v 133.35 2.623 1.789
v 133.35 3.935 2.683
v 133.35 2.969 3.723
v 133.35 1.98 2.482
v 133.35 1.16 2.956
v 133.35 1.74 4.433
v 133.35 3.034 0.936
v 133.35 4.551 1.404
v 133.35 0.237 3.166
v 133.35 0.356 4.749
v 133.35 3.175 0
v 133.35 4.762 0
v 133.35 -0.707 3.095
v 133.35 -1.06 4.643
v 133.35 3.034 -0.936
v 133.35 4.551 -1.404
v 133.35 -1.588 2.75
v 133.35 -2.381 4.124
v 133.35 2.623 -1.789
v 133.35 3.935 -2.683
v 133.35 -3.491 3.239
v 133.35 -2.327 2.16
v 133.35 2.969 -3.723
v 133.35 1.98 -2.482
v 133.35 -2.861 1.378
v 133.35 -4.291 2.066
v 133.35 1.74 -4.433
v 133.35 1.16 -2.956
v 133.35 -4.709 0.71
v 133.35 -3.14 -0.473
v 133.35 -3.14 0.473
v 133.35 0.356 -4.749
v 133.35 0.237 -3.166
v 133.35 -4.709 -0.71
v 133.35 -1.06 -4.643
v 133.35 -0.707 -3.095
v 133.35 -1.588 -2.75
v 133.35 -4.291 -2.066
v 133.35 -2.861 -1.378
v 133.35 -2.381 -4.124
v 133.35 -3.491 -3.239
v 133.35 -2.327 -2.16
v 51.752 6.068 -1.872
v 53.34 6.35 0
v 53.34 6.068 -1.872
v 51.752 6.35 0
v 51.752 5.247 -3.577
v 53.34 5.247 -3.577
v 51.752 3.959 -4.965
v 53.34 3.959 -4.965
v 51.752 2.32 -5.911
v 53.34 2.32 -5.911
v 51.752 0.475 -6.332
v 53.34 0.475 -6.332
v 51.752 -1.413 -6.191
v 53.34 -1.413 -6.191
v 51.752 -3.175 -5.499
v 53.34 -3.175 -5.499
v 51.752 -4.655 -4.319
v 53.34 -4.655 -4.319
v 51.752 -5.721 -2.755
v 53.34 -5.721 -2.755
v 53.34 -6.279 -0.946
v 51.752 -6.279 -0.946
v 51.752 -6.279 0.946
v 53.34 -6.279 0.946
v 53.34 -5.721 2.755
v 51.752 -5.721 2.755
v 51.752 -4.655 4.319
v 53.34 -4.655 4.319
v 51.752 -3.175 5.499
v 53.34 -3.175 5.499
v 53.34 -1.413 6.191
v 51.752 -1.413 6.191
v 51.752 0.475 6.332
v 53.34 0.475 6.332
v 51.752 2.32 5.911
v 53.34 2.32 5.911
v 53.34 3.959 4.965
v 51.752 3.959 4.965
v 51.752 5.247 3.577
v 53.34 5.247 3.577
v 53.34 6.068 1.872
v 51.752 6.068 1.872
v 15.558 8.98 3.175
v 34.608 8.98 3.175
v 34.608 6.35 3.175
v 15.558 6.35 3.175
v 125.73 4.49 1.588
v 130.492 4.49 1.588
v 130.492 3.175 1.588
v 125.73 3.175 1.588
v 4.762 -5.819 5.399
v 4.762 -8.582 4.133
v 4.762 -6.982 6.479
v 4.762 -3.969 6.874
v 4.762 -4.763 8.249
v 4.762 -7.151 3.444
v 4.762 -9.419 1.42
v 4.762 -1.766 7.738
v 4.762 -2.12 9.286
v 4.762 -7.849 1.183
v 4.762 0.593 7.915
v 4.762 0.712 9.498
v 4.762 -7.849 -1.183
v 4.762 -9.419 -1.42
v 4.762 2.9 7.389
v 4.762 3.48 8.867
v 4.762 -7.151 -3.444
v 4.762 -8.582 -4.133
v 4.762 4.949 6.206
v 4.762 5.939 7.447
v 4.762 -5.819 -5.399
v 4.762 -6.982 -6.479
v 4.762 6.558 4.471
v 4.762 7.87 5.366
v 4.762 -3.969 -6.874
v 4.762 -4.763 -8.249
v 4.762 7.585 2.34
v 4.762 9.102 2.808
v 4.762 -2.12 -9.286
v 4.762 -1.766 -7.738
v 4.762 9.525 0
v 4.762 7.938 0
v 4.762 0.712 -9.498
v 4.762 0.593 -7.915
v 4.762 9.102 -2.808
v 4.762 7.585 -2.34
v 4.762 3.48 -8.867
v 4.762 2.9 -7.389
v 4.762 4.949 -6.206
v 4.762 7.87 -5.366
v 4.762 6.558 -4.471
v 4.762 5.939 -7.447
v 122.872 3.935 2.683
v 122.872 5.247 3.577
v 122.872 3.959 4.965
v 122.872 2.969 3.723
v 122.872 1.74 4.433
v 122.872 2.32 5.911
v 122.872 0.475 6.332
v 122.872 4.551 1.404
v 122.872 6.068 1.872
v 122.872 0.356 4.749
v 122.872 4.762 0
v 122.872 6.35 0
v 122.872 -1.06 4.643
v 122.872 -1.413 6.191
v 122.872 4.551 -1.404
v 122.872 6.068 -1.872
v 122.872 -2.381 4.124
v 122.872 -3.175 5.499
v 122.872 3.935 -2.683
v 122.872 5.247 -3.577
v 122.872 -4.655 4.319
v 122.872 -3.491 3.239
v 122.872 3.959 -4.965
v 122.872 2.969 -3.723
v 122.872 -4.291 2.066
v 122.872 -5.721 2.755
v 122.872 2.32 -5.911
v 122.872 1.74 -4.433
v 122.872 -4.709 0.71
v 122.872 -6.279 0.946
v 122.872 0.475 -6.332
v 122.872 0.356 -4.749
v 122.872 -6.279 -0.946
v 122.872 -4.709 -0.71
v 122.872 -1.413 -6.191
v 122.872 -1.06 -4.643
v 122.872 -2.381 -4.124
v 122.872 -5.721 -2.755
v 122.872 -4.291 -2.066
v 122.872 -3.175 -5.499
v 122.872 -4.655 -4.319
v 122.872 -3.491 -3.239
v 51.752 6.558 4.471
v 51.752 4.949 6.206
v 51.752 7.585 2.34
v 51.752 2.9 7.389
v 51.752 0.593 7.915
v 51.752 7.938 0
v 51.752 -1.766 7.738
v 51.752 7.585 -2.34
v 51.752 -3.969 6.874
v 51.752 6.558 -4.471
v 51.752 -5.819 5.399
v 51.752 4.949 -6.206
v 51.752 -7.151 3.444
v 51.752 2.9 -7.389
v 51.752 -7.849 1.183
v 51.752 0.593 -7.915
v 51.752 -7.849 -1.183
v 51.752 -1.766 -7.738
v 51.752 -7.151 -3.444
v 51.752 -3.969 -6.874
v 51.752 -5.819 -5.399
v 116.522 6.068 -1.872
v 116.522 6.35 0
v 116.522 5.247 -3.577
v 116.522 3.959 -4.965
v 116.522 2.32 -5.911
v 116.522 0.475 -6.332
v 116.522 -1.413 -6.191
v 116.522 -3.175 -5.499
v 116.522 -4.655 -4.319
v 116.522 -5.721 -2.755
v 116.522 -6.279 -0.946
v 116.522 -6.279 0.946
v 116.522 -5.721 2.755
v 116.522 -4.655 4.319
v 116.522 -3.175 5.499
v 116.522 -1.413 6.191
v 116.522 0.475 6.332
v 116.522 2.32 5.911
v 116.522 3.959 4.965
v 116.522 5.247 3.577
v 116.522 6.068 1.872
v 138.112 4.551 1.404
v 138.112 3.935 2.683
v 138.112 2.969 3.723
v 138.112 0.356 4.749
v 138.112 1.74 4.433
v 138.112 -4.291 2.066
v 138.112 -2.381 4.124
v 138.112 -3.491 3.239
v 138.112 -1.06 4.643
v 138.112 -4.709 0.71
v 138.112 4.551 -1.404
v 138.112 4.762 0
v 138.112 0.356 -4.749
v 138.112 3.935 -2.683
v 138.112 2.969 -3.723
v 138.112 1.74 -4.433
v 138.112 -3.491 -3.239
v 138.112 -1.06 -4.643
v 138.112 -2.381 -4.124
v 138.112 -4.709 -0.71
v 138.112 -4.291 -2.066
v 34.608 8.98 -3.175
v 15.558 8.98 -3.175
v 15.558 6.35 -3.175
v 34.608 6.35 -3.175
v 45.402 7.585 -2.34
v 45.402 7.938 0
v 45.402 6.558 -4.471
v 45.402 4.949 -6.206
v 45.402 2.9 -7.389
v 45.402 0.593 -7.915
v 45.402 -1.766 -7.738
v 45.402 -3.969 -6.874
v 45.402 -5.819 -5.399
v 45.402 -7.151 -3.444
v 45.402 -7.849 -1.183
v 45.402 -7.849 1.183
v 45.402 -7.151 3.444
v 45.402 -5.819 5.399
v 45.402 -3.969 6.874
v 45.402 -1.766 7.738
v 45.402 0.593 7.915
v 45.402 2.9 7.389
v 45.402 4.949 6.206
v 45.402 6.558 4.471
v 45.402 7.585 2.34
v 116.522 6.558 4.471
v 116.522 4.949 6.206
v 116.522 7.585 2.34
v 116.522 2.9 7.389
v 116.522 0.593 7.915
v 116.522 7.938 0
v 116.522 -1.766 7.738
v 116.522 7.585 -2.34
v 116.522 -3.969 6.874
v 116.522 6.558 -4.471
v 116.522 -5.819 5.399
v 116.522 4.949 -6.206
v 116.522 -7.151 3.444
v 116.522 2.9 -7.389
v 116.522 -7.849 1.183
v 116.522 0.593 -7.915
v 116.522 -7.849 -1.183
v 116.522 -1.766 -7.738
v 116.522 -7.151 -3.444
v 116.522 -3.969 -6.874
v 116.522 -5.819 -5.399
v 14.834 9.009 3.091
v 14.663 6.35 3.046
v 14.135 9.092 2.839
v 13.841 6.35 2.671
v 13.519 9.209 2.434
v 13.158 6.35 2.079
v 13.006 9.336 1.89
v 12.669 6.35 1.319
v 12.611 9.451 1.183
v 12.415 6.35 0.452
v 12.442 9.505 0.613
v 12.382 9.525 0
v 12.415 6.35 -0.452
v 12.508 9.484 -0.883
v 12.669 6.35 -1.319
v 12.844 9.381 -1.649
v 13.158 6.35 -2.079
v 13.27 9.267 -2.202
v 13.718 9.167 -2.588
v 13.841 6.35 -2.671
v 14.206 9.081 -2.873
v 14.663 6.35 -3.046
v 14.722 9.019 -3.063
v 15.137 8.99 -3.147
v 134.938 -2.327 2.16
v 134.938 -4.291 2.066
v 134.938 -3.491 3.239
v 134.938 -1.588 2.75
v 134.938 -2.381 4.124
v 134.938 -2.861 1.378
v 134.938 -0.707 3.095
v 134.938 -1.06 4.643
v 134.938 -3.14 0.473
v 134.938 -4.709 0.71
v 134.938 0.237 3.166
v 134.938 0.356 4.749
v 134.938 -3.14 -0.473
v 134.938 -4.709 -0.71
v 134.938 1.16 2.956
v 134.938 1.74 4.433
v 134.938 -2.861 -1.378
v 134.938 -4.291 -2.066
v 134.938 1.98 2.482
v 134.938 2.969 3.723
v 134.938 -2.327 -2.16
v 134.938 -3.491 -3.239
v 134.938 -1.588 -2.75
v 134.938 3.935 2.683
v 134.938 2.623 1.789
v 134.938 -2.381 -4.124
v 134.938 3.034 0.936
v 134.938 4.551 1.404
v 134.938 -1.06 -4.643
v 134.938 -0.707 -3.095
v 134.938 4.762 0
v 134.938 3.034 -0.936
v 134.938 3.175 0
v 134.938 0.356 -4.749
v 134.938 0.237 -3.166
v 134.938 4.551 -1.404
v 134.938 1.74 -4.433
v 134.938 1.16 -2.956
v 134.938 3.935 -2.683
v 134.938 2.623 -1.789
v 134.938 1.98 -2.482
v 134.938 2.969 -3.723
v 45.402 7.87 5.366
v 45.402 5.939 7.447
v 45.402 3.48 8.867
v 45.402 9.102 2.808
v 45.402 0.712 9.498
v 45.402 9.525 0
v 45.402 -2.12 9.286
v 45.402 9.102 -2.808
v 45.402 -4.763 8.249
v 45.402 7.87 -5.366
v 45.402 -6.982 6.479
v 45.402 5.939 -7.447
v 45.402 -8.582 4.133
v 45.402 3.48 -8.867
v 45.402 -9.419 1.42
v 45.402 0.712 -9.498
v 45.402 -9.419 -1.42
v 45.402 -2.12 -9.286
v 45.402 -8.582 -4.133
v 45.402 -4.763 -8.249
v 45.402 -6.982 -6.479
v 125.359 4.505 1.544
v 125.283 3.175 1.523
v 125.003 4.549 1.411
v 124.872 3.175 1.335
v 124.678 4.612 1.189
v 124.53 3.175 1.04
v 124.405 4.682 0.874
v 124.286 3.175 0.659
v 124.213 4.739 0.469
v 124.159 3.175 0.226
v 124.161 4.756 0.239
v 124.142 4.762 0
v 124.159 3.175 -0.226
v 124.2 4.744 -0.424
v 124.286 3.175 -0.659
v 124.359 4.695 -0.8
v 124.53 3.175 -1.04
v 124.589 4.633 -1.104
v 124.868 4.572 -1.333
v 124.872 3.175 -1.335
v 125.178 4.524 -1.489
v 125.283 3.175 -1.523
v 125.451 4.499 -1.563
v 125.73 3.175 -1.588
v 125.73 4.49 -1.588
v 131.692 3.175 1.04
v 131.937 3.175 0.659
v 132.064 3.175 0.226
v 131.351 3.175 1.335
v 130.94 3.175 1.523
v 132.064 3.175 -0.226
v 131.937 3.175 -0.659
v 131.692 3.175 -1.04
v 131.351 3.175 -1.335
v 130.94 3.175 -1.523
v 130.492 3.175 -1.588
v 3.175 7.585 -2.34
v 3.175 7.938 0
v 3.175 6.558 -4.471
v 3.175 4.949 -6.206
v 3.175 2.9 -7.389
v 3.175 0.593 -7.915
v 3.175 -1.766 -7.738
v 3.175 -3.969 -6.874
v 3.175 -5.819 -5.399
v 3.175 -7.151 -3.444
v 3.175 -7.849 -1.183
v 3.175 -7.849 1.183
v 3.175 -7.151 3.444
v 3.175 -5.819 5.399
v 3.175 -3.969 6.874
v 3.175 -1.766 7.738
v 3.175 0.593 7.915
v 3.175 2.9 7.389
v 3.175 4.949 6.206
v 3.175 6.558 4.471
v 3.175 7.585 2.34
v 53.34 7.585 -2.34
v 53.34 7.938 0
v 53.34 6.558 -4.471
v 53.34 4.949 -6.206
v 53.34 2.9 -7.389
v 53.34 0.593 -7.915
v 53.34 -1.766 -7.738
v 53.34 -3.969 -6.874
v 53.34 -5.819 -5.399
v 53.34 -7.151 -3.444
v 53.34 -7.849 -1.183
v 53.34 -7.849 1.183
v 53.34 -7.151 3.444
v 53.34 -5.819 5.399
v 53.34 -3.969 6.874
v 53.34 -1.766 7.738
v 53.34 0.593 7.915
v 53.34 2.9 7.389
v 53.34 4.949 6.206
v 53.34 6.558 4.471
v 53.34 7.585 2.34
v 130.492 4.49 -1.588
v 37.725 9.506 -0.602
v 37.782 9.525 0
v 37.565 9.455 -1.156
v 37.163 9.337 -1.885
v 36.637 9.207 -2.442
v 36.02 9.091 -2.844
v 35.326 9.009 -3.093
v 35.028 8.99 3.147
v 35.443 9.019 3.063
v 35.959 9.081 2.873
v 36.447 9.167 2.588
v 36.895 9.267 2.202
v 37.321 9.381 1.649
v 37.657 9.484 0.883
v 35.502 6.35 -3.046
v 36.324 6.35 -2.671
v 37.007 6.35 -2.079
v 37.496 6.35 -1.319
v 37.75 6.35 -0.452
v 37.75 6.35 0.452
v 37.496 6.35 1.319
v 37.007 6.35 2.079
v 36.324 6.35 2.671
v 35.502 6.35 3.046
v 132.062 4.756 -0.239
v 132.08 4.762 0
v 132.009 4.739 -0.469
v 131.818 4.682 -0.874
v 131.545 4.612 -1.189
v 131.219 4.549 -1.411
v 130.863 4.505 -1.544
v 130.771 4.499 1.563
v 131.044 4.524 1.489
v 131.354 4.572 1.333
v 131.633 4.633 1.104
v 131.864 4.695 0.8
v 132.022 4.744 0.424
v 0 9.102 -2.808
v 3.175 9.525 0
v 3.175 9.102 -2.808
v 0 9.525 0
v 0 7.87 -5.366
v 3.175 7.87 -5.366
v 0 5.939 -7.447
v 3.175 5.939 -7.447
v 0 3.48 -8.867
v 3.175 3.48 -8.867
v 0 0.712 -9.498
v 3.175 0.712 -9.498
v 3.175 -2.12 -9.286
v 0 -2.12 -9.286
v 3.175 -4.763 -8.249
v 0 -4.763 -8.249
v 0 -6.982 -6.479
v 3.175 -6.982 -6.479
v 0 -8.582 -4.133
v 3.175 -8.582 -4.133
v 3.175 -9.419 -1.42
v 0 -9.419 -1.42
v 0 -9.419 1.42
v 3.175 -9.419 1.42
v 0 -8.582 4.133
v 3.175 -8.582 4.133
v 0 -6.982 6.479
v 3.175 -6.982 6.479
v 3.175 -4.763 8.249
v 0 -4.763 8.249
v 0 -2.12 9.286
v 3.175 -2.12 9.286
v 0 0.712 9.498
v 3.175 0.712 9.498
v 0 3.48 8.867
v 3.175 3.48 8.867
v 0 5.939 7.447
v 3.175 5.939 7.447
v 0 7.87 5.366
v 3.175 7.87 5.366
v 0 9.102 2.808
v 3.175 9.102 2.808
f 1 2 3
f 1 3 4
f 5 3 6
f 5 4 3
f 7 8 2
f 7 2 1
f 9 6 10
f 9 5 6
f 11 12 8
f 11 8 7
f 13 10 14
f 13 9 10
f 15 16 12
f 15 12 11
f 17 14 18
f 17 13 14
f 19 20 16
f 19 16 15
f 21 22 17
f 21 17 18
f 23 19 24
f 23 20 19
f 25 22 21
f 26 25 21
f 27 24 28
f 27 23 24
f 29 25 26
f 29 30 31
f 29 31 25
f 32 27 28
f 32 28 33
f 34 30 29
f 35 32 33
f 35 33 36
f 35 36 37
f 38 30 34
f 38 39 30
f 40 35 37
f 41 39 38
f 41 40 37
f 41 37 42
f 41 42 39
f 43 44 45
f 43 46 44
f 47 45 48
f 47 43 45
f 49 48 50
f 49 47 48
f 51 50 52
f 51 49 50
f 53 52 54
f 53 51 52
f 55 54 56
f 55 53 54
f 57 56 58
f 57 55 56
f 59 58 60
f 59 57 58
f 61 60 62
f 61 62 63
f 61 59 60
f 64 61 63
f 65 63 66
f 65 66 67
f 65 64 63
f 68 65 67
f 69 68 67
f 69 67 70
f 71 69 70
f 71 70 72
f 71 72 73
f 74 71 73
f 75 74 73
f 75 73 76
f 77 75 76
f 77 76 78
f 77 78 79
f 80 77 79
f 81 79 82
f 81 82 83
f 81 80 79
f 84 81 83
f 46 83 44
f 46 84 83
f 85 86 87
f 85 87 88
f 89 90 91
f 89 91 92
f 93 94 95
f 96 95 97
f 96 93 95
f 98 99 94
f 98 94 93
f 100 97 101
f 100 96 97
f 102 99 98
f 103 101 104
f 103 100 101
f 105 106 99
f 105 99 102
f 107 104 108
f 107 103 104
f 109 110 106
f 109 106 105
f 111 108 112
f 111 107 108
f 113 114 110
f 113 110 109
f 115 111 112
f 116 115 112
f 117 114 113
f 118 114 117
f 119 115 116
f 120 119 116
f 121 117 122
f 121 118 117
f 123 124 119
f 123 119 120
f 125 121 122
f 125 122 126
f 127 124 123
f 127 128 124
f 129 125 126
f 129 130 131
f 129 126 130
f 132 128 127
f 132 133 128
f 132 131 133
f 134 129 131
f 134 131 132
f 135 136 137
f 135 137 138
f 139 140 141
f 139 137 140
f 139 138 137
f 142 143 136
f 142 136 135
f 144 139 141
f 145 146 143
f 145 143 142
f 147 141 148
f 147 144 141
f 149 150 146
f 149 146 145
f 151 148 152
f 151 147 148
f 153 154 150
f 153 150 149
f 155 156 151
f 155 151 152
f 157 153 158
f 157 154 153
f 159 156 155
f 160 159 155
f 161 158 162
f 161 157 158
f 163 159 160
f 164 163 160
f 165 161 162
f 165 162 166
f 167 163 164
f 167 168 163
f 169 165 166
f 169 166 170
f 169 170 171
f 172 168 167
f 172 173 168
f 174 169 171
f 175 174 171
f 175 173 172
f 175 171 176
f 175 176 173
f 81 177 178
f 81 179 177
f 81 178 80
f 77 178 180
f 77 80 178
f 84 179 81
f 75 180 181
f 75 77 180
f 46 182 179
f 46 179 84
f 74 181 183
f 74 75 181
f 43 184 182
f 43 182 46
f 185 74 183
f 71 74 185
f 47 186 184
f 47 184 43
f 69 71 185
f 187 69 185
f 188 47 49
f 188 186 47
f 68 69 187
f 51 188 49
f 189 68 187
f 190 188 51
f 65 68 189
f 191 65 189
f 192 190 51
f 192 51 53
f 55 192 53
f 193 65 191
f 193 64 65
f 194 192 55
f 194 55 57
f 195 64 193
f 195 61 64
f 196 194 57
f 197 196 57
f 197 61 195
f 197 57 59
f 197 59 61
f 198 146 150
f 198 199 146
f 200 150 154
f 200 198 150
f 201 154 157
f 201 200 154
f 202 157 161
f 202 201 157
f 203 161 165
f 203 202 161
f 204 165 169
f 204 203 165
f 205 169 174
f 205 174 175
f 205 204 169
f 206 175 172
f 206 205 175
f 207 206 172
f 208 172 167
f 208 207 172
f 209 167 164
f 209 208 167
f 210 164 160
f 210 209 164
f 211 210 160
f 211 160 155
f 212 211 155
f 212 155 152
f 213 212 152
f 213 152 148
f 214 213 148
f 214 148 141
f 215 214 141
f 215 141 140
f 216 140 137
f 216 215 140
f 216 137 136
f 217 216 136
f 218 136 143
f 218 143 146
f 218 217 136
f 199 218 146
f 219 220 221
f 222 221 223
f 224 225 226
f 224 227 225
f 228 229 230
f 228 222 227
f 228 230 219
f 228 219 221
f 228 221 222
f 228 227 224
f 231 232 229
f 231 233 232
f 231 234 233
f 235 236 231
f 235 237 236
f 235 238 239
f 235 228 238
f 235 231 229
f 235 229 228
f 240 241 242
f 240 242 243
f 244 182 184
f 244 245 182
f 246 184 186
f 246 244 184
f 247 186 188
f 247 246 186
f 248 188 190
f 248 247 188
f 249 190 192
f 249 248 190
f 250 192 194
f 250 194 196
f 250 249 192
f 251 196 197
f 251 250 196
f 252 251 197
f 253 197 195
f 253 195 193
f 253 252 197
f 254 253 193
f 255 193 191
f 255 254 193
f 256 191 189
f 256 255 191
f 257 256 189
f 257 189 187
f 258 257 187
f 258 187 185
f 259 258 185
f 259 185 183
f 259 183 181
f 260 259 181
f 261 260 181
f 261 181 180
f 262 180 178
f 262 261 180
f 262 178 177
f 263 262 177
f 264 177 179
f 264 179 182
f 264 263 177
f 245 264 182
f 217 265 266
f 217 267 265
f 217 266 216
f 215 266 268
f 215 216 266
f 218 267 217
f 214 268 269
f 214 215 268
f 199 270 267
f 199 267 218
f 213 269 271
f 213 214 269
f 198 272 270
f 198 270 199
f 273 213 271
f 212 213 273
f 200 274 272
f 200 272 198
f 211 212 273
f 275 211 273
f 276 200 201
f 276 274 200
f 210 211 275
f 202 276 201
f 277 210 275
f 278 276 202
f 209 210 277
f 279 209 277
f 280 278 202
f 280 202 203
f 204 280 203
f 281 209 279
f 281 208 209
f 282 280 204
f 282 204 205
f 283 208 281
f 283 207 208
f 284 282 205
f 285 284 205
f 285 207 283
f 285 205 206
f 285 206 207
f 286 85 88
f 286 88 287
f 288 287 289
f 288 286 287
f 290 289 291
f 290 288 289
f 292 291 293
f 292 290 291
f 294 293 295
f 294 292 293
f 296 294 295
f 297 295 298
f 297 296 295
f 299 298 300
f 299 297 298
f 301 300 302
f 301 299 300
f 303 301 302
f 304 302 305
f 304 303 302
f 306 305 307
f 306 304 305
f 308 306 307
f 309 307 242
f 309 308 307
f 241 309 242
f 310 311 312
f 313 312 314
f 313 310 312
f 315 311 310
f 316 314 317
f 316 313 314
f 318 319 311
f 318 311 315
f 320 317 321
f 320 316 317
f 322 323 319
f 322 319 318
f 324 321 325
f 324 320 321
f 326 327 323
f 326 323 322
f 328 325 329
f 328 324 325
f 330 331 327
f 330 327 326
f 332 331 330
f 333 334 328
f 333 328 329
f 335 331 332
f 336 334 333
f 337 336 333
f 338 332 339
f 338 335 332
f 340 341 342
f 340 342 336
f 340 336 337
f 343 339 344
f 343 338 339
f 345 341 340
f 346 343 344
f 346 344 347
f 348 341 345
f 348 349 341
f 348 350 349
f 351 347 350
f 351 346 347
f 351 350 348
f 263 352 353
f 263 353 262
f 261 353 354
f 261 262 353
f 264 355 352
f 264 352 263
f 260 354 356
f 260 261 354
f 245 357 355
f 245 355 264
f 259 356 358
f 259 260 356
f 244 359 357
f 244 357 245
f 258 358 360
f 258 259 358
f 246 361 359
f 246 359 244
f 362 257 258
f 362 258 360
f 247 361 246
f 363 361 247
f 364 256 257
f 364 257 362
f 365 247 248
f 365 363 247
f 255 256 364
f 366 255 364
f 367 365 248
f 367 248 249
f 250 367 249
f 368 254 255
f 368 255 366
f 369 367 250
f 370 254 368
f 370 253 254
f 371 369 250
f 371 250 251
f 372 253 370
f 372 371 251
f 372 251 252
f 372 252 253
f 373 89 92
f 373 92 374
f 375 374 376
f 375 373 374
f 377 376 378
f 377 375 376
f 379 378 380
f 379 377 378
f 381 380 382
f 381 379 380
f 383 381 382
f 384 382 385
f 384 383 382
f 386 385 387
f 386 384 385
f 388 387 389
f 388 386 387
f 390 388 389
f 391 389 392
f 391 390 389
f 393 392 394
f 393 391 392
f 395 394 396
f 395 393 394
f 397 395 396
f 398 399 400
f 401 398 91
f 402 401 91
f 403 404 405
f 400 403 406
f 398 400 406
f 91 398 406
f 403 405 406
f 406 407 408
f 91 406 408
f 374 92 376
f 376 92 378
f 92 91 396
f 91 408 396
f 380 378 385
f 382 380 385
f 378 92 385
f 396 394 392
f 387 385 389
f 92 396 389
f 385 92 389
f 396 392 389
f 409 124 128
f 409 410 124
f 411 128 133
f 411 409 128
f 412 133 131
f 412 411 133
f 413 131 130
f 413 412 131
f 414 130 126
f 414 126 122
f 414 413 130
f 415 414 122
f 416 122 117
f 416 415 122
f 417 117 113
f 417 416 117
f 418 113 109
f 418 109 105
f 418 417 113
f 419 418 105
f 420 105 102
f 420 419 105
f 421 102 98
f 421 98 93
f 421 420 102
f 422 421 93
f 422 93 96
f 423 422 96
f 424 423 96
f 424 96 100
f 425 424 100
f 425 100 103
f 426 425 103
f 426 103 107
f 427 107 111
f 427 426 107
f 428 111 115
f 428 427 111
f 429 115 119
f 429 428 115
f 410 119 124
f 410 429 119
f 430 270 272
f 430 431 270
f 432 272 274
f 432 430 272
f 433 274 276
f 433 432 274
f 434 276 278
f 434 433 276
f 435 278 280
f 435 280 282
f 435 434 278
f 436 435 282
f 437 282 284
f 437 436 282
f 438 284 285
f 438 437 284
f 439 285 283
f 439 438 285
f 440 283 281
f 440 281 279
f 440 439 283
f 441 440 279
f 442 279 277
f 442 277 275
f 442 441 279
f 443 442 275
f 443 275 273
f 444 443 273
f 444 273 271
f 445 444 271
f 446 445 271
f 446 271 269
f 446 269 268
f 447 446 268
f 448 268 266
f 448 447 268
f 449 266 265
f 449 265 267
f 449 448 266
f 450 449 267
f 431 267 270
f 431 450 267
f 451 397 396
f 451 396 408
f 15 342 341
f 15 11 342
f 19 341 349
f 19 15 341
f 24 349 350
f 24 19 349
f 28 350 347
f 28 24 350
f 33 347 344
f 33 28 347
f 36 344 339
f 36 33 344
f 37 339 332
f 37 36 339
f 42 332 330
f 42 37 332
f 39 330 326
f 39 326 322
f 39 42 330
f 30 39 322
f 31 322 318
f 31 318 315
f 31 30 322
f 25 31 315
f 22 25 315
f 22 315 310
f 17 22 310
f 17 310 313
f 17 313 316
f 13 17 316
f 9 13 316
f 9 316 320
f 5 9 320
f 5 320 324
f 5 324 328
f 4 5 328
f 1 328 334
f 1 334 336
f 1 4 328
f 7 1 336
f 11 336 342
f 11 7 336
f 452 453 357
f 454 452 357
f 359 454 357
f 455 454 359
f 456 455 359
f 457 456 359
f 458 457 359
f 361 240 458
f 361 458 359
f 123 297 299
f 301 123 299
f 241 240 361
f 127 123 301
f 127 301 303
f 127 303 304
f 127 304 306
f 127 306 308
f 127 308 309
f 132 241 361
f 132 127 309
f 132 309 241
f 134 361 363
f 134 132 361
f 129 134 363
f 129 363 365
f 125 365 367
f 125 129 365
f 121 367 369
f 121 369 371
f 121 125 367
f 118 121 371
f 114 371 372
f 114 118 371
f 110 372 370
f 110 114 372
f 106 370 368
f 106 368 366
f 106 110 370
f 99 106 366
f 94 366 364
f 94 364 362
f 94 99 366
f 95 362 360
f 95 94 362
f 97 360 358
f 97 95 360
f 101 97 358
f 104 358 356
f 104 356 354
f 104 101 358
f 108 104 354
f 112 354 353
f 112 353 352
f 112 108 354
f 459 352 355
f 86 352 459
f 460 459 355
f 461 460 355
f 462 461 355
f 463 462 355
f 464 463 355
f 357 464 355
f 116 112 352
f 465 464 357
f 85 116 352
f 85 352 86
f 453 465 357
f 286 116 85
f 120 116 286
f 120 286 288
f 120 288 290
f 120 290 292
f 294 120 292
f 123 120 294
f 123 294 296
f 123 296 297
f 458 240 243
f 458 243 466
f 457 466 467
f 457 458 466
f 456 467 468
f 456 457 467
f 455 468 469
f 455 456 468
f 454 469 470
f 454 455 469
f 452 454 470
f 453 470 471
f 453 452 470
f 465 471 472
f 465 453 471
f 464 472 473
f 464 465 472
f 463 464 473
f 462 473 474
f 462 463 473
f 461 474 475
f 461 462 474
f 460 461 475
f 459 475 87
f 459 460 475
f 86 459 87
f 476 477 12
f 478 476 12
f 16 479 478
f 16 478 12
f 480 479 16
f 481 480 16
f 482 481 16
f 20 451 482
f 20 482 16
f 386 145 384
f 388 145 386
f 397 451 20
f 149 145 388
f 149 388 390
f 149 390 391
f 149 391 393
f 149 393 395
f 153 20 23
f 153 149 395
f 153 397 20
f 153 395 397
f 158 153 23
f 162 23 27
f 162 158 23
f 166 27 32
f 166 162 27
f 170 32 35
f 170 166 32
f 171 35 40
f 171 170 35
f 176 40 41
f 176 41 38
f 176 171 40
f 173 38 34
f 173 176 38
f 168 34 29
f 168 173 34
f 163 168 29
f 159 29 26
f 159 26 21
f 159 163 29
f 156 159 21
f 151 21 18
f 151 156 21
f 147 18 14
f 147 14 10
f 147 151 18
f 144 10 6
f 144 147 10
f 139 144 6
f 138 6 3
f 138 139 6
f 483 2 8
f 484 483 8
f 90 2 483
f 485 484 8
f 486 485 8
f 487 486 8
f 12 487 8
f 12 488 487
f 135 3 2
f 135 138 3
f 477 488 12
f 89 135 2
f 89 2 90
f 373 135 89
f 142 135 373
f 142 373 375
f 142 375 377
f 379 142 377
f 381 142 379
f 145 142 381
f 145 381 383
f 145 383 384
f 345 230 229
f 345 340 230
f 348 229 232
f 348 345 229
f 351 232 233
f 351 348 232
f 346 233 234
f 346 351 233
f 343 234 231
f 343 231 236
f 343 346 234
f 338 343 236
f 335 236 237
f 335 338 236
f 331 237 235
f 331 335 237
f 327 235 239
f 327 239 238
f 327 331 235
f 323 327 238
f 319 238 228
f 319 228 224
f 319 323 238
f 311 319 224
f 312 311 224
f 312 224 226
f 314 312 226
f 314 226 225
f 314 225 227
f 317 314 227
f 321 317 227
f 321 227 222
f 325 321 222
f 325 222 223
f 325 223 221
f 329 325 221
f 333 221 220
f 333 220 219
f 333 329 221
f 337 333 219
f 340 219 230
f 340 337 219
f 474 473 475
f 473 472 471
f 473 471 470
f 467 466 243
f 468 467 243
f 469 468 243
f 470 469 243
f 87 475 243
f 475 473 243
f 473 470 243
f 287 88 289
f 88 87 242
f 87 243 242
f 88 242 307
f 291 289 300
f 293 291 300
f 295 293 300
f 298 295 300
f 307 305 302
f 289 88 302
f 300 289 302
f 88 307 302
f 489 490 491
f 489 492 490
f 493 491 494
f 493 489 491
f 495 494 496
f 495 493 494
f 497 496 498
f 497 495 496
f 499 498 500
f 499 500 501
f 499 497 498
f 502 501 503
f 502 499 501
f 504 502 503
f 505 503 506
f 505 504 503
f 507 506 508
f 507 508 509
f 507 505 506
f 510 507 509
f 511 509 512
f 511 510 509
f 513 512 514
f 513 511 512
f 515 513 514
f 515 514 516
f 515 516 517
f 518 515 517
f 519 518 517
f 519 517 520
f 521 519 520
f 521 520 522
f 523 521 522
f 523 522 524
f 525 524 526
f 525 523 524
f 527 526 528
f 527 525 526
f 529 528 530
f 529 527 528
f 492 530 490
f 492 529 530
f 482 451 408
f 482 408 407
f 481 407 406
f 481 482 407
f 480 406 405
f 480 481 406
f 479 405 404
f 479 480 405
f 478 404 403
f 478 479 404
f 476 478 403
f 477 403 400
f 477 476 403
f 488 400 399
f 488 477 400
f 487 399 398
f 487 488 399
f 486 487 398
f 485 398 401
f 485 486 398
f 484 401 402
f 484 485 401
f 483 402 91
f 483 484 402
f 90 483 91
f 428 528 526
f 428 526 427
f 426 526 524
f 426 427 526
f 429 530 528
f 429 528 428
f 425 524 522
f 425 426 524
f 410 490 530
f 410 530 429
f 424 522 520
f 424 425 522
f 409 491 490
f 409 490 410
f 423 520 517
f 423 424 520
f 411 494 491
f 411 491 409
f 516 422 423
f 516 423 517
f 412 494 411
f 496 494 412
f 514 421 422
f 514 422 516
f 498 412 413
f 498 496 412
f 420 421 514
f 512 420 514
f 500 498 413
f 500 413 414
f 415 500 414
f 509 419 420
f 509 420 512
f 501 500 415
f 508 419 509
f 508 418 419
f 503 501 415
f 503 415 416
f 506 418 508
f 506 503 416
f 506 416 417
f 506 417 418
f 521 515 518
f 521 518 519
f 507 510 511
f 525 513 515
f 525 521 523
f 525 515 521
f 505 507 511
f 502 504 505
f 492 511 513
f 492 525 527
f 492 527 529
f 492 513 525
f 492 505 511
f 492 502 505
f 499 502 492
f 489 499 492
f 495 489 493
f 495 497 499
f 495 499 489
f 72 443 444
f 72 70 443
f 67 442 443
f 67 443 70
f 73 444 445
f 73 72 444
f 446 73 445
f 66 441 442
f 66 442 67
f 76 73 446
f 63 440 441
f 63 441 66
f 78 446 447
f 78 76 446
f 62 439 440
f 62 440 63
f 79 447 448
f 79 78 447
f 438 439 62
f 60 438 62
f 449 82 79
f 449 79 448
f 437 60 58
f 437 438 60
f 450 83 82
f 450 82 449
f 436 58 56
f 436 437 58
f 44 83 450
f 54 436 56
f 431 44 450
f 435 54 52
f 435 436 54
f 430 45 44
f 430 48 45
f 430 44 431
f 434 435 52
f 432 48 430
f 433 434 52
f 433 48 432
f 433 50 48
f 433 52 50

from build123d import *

# Parameters (mm, degrees)
CUT_EXTRUDE1_DEPTH = 3.175
CUT_EXTRUDE2_DEPTH = 1.5875


with BuildPart() as part:
    # Sketch2 → Revolve1 (revolve)
    with BuildSketch(Plane.XY):
        Polygon((0, 0), (138.1125, 0), (138.1125, 4.7625), (134.9375, 4.7625), (134.9375, 3.175), (133.35, 3.175), (133.35, 4.7625), (122.8725, 4.7625), (122.8725, 6.35), (116.5225, 6.35), (116.5225, 7.9375), (53.34, 7.9375), (53.34, 6.35), (51.7525, 6.35), (51.7525, 7.9375), (45.4025, 7.9375), (45.4025, 9.525), (4.7625, 9.525), (4.7625, 7.9375), (3.175, 7.9375), (3.175, 9.525), (0, 9.525), align=None)
    revolve(axis=Axis((0, 0, 0), (-1, 0, 0)))

    # Sketch3 → Cut-Extrude1 (cut)
    with BuildSketch(Plane(origin=(0, 9.525, 0), x_dir=(1, 0, 0), z_dir=(0, 1, 0))):
        with BuildLine():
            Line((15.5575, 3.175), (34.6075, 3.175))
            ThreePointArc((34.6075, 3.175), (37.7825, 0), (34.6075, -3.175))
            Line((34.6075, -3.175), (15.5575, -3.175))
            ThreePointArc((15.5575, -3.175), (12.3825, 0), (15.5575, 3.175))
        make_face()
    extrude(amount=-CUT_EXTRUDE1_DEPTH, mode=Mode.SUBTRACT)

    # Sketch4 → Cut-Extrude2 (cut)
    with BuildSketch(Plane(origin=(0, 4.7625, 0), x_dir=(1, 0, 0), z_dir=(0, 1, 0))):
        with BuildLine():
            Line((125.73, 1.5875), (130.4925, 1.5875))
            ThreePointArc((130.4925, 1.5875), (132.08, 0), (130.4925, -1.5875))
            Line((130.4925, -1.5875), (125.73, -1.5875))
            ThreePointArc((125.73, -1.5875), (124.1425, 0), (125.73, 1.5875))
        make_face()
    extrude(amount=-CUT_EXTRUDE2_DEPTH, mode=Mode.SUBTRACT)


solid = part.part
